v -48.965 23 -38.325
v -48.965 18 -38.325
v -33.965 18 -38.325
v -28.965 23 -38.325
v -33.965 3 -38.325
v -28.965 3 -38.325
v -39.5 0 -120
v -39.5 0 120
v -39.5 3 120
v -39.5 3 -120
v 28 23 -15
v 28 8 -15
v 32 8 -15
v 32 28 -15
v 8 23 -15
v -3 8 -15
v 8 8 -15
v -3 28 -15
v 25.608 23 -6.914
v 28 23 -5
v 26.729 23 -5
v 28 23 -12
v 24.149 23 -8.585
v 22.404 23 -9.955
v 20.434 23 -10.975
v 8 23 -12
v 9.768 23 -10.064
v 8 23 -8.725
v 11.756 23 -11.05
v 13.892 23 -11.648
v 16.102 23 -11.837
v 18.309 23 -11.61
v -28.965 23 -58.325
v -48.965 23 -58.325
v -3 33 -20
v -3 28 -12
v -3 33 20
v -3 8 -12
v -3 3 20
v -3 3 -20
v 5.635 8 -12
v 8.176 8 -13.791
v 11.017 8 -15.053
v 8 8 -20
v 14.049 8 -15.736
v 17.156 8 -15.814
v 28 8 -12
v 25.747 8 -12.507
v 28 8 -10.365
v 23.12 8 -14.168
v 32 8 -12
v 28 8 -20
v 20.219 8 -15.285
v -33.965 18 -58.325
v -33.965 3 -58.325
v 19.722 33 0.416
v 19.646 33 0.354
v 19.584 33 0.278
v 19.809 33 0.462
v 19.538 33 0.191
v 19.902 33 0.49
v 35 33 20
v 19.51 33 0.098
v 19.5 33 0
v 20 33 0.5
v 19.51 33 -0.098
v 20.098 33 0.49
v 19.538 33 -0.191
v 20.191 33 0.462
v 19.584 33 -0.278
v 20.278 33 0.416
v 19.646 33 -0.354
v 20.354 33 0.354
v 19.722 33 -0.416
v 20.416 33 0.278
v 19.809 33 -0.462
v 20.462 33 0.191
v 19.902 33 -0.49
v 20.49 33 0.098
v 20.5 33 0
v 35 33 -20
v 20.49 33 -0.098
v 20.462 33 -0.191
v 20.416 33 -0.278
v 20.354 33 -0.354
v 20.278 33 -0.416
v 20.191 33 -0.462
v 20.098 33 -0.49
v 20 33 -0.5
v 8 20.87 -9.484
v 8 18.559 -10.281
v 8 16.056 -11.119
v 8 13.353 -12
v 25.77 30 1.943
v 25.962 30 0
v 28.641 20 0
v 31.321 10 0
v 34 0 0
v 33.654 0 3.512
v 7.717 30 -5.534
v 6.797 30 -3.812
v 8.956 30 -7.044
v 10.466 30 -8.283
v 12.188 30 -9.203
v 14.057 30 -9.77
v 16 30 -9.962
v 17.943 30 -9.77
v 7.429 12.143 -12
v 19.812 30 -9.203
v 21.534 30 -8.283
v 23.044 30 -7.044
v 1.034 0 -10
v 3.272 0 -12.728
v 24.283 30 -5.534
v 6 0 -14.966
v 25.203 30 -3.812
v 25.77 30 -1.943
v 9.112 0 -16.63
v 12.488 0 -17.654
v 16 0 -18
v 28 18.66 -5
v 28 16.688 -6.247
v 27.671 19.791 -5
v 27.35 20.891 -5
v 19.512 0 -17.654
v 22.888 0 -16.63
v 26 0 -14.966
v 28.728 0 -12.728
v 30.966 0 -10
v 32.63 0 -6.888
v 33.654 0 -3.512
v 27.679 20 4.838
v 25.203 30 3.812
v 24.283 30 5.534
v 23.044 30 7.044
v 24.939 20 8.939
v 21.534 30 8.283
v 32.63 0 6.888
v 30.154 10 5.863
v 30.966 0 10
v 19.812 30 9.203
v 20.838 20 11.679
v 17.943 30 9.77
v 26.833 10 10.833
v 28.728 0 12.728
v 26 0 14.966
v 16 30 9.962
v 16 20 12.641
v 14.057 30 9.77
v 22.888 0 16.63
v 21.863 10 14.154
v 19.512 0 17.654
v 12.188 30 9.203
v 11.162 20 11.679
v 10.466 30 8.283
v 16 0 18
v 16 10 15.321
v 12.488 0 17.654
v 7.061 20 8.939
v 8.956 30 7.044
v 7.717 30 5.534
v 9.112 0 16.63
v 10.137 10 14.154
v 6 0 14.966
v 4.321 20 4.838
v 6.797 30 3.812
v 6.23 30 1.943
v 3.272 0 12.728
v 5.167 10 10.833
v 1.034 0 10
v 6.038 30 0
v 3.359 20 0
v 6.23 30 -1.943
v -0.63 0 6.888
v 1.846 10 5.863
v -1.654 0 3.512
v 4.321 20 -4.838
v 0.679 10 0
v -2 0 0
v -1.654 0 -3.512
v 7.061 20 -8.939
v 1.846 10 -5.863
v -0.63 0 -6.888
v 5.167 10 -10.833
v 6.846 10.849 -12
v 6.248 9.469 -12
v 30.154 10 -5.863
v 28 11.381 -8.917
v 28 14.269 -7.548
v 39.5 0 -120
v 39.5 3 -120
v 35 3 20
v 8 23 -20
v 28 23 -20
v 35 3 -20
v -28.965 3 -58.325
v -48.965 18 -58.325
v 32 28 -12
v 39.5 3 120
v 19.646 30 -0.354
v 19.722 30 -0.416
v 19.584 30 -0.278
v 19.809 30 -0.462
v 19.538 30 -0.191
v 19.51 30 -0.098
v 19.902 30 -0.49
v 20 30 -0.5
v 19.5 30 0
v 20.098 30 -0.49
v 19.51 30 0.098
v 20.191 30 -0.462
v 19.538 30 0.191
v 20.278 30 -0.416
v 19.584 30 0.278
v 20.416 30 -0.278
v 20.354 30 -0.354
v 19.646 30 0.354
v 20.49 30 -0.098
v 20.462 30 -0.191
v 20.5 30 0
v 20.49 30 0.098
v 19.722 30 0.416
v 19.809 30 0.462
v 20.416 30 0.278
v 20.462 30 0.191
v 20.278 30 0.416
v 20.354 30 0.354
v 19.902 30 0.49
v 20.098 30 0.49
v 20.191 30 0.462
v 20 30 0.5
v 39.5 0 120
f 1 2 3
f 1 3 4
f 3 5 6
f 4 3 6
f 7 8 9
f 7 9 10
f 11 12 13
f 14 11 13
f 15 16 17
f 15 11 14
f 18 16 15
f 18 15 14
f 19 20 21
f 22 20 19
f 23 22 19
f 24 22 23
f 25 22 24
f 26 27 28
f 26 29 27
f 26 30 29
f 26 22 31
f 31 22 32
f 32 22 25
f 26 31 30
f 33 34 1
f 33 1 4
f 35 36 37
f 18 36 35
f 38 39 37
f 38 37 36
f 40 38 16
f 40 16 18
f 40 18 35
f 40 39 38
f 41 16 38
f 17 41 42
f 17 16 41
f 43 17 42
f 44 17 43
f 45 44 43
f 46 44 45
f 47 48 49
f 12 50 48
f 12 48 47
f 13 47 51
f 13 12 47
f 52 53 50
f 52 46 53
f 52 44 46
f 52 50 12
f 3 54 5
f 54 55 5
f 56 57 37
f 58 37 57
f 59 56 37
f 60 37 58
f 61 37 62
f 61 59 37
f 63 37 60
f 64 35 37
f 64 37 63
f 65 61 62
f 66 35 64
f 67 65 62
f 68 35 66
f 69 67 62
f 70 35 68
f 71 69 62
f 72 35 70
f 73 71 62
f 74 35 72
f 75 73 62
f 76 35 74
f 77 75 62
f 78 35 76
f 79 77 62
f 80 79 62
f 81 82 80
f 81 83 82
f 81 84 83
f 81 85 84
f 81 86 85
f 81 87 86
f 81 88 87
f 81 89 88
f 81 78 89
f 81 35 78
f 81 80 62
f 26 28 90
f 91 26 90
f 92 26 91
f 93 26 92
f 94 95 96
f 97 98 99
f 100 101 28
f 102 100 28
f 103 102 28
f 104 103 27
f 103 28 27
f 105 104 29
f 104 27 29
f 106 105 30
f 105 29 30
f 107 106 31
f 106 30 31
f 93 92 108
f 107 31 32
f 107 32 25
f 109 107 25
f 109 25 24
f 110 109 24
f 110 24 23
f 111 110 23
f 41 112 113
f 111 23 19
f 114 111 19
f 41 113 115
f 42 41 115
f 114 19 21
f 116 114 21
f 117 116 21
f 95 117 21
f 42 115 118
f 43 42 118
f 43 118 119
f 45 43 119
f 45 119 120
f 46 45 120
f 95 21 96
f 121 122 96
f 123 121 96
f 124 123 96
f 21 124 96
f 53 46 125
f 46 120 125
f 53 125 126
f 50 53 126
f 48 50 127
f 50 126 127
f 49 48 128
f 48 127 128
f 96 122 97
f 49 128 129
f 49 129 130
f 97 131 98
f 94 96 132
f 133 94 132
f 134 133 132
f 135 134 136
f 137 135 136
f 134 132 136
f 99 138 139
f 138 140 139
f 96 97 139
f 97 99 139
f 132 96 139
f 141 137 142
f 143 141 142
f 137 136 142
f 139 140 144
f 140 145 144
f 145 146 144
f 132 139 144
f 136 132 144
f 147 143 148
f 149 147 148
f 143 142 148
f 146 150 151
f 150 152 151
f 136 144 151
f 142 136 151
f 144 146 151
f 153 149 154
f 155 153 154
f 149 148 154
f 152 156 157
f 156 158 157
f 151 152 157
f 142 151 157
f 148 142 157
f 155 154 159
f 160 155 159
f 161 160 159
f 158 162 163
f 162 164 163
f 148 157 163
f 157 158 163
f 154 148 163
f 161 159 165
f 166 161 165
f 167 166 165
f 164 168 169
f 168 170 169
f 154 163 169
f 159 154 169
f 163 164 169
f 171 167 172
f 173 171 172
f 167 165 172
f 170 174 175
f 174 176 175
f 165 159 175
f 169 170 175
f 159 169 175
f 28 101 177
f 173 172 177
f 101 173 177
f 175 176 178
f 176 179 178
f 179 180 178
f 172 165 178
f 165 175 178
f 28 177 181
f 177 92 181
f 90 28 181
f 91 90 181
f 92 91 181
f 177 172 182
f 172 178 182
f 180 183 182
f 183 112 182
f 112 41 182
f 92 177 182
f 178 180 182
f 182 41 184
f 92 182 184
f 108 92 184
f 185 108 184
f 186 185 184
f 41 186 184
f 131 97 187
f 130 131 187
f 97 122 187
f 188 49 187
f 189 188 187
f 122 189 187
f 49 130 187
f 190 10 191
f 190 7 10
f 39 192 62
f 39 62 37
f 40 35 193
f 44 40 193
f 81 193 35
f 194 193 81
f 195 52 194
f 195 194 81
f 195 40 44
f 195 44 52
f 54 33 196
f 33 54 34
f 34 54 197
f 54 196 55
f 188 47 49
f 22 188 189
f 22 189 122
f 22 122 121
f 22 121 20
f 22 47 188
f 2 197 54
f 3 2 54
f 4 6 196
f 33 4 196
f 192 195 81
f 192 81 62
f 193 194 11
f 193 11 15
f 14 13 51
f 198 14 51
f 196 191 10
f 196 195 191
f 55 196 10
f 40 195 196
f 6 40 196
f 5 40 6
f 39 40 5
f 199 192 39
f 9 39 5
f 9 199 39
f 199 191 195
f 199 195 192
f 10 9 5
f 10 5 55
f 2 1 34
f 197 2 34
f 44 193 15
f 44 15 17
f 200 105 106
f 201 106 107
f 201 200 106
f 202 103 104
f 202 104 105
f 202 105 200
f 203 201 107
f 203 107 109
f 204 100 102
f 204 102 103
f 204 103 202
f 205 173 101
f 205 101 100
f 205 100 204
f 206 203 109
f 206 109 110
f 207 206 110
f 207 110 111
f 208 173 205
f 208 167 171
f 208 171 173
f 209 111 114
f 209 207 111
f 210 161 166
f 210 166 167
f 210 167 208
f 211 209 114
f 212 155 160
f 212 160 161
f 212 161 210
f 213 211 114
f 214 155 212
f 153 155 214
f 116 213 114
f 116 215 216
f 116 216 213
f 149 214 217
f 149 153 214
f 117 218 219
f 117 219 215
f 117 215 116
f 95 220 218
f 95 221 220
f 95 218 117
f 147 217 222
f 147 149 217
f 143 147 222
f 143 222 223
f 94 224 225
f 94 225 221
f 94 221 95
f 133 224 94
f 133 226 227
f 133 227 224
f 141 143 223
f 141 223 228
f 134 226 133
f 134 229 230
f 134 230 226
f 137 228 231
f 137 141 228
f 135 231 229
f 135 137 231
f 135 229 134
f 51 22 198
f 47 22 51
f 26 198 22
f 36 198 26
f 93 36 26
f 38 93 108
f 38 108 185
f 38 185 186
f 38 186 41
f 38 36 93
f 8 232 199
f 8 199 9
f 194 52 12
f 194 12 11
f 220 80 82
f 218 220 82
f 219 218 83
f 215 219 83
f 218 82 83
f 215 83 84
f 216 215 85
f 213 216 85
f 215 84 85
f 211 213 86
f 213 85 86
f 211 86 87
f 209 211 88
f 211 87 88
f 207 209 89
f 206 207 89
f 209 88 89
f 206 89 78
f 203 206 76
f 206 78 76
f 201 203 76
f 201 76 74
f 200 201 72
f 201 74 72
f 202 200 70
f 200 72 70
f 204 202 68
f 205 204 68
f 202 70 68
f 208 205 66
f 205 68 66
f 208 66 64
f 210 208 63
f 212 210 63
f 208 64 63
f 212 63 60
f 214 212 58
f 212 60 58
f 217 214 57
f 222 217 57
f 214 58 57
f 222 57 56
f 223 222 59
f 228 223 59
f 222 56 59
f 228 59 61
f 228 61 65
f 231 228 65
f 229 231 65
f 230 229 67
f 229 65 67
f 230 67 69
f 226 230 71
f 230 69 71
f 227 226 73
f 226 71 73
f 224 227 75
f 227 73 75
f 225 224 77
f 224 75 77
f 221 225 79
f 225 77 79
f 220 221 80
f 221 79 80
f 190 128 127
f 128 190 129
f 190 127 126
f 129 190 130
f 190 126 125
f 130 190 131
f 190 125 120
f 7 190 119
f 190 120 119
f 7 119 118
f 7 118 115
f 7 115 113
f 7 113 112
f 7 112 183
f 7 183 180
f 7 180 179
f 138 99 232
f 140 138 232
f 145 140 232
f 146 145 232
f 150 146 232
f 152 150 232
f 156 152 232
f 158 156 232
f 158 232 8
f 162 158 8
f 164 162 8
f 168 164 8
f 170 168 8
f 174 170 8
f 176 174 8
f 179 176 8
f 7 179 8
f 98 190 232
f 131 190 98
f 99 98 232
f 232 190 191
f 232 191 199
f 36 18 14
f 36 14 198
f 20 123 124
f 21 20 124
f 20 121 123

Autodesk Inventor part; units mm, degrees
ref_plane "YZ Plane" through (0, 0, 0) normal (1, 0, 0) x (0, 1, 0)
ref_plane "XZ Plane" through (0, 0, 0) normal (0, 1, 0) x (-1, 0, 0)
ref_plane "XY Plane" through (0, 0, 0) normal (0, 0, 1) x (1, 0, 0)
sketch "Sketch44" plane through (0, 0, 0) normal (0, 1, 0) x (-1, 0, 0)
  line L0 (-39.5, 120) -> (39.5, 120)
  line L1 (39.5, 120) -> (39.5, -120)
  line L2 (39.5, -120) -> (-39.5, -120)
  line L3 (-39.5, -120) -> (-39.5, 120)
  line L4 (-39.5, 120) -> (39.5, -120) construction
  line L5 (39.5, 120) -> (-39.5, -120) construction
  point P0 (0, 0)
  dimension "d138" = 79
  dimension "d139" = 240
extrude "Extrusion33" add sketch "Sketch44" along normal blind 3
sketch "Sketch45" plane through (0, 3, 0) normal (0, 1, 0) x (1, 0, 0)
  line L0 (35, -20) -> (-3, -20)
  line L1 (-3, -20) -> (-3, 20)
  line L2 (-3, 20) -> (35, 20)
  line L3 (35, 20) -> (35, -20)
  point P0 (0, 0)
  dimension "d142" = 38
  dimension "d143" = 40
extrude "Extrusion34" add sketch "Sketch45" along normal blind 30
sketch "Sketch46" plane through (0, 33, 0) normal (0, 1, 0) x (1, 0, 0)
  point P0 (0, 0)
sketch "Sketch47" plane through (0, 0, 0) normal (0, -1, 0) x (1, 0, 0)
  circle A0 centre (16, 0) radius 18
  point P0 (0, 0)
  dimension "d146" = 36
extrude "Extrusion35" cut sketch "Sketch47" against normal blind 30 draft -15
sketch "Sketch48" plane through (0, 33, 0) normal (0, 1, 0) x (1, 0, 0)
  point P0 (0, 0)
sketch "Sketch49" plane through (0, 33, 0) normal (0, 1, 0) x (1, 0, 0)
  circle A0 centre (20, 0) radius 0.5
  point P0 (0, 0)
  dimension "d149" = 1
extrude "Extrusion36" cut sketch "Sketch49" against normal through all
sketch "Sketch58" plane through (35, 3, -20) normal (0, 0, -1) x (-1, 0, 0)
  line L0 (7, 20) -> (27, 20)
  line L1 (27, 20) -> (27, 5)
  line L2 (27, 5) -> (7, 5)
  line L3 (7, 5) -> (7, 20)
  point P0 (35, -3)
  dimension "d156" = 20
  dimension "d157" = 15
extrude "Extrusion38" cut sketch "Sketch58" against normal blind 15
sketch "Sketch59" plane through (-3, 3, -20) normal (-1, 0, 0) x (0, 0, 1)
  line L0 (5, 25) -> (8, 25)
  line L1 (8, 25) -> (8, 5)
  line L2 (8, 5) -> (5, 5)
  line L3 (5, 5) -> (5, 25)
  point P0 (20, -3)
  dimension "d160" = 3
  dimension "d161" = 20
extrude "Extrusion39" cut sketch "Sketch59" against normal blind 35
sketch "Sketch60" plane through (0, 3, 0) normal (0, 1, 0) x (1, 0, 0)
  line L0 (-33.965, 38.3247) -> (-28.965, 38.3247)
  line L1 (-28.965, 38.3247) -> (-28.965, 58.3247)
  line L2 (-28.965, 58.3247) -> (-33.965, 58.3247)
  line L3 (-33.965, 58.3247) -> (-33.965, 38.3247)
  point P0 (0, 0)
  dimension "d164" = 5
  dimension "d165" = 20
extrude "Extrusion40" add sketch "Sketch60" along normal blind 20
sketch "Sketch61" plane through (0, 23, 0) normal (0, 1, 0) x (1, 0, 0)
  line L0 (-28.965, 38.3247) -> (-28.965, 58.3247) projected
  line L1 (-28.965, 38.3247) -> (-48.965, 38.3247)
  line L2 (-48.965, 38.3247) -> (-48.965, 58.3247)
  line L3 (-48.965, 58.3247) -> (-28.965, 58.3247)
  line L4 (-28.965, 58.3247) -> (-28.965, 38.3247)
  point P0 (0, 0)
  dimension "d168" = 20
  dimension "d169" = 20
extrude "Extrusion41" add sketch "Sketch61" against normal blind 5
properties part number "liquid port_v07"
